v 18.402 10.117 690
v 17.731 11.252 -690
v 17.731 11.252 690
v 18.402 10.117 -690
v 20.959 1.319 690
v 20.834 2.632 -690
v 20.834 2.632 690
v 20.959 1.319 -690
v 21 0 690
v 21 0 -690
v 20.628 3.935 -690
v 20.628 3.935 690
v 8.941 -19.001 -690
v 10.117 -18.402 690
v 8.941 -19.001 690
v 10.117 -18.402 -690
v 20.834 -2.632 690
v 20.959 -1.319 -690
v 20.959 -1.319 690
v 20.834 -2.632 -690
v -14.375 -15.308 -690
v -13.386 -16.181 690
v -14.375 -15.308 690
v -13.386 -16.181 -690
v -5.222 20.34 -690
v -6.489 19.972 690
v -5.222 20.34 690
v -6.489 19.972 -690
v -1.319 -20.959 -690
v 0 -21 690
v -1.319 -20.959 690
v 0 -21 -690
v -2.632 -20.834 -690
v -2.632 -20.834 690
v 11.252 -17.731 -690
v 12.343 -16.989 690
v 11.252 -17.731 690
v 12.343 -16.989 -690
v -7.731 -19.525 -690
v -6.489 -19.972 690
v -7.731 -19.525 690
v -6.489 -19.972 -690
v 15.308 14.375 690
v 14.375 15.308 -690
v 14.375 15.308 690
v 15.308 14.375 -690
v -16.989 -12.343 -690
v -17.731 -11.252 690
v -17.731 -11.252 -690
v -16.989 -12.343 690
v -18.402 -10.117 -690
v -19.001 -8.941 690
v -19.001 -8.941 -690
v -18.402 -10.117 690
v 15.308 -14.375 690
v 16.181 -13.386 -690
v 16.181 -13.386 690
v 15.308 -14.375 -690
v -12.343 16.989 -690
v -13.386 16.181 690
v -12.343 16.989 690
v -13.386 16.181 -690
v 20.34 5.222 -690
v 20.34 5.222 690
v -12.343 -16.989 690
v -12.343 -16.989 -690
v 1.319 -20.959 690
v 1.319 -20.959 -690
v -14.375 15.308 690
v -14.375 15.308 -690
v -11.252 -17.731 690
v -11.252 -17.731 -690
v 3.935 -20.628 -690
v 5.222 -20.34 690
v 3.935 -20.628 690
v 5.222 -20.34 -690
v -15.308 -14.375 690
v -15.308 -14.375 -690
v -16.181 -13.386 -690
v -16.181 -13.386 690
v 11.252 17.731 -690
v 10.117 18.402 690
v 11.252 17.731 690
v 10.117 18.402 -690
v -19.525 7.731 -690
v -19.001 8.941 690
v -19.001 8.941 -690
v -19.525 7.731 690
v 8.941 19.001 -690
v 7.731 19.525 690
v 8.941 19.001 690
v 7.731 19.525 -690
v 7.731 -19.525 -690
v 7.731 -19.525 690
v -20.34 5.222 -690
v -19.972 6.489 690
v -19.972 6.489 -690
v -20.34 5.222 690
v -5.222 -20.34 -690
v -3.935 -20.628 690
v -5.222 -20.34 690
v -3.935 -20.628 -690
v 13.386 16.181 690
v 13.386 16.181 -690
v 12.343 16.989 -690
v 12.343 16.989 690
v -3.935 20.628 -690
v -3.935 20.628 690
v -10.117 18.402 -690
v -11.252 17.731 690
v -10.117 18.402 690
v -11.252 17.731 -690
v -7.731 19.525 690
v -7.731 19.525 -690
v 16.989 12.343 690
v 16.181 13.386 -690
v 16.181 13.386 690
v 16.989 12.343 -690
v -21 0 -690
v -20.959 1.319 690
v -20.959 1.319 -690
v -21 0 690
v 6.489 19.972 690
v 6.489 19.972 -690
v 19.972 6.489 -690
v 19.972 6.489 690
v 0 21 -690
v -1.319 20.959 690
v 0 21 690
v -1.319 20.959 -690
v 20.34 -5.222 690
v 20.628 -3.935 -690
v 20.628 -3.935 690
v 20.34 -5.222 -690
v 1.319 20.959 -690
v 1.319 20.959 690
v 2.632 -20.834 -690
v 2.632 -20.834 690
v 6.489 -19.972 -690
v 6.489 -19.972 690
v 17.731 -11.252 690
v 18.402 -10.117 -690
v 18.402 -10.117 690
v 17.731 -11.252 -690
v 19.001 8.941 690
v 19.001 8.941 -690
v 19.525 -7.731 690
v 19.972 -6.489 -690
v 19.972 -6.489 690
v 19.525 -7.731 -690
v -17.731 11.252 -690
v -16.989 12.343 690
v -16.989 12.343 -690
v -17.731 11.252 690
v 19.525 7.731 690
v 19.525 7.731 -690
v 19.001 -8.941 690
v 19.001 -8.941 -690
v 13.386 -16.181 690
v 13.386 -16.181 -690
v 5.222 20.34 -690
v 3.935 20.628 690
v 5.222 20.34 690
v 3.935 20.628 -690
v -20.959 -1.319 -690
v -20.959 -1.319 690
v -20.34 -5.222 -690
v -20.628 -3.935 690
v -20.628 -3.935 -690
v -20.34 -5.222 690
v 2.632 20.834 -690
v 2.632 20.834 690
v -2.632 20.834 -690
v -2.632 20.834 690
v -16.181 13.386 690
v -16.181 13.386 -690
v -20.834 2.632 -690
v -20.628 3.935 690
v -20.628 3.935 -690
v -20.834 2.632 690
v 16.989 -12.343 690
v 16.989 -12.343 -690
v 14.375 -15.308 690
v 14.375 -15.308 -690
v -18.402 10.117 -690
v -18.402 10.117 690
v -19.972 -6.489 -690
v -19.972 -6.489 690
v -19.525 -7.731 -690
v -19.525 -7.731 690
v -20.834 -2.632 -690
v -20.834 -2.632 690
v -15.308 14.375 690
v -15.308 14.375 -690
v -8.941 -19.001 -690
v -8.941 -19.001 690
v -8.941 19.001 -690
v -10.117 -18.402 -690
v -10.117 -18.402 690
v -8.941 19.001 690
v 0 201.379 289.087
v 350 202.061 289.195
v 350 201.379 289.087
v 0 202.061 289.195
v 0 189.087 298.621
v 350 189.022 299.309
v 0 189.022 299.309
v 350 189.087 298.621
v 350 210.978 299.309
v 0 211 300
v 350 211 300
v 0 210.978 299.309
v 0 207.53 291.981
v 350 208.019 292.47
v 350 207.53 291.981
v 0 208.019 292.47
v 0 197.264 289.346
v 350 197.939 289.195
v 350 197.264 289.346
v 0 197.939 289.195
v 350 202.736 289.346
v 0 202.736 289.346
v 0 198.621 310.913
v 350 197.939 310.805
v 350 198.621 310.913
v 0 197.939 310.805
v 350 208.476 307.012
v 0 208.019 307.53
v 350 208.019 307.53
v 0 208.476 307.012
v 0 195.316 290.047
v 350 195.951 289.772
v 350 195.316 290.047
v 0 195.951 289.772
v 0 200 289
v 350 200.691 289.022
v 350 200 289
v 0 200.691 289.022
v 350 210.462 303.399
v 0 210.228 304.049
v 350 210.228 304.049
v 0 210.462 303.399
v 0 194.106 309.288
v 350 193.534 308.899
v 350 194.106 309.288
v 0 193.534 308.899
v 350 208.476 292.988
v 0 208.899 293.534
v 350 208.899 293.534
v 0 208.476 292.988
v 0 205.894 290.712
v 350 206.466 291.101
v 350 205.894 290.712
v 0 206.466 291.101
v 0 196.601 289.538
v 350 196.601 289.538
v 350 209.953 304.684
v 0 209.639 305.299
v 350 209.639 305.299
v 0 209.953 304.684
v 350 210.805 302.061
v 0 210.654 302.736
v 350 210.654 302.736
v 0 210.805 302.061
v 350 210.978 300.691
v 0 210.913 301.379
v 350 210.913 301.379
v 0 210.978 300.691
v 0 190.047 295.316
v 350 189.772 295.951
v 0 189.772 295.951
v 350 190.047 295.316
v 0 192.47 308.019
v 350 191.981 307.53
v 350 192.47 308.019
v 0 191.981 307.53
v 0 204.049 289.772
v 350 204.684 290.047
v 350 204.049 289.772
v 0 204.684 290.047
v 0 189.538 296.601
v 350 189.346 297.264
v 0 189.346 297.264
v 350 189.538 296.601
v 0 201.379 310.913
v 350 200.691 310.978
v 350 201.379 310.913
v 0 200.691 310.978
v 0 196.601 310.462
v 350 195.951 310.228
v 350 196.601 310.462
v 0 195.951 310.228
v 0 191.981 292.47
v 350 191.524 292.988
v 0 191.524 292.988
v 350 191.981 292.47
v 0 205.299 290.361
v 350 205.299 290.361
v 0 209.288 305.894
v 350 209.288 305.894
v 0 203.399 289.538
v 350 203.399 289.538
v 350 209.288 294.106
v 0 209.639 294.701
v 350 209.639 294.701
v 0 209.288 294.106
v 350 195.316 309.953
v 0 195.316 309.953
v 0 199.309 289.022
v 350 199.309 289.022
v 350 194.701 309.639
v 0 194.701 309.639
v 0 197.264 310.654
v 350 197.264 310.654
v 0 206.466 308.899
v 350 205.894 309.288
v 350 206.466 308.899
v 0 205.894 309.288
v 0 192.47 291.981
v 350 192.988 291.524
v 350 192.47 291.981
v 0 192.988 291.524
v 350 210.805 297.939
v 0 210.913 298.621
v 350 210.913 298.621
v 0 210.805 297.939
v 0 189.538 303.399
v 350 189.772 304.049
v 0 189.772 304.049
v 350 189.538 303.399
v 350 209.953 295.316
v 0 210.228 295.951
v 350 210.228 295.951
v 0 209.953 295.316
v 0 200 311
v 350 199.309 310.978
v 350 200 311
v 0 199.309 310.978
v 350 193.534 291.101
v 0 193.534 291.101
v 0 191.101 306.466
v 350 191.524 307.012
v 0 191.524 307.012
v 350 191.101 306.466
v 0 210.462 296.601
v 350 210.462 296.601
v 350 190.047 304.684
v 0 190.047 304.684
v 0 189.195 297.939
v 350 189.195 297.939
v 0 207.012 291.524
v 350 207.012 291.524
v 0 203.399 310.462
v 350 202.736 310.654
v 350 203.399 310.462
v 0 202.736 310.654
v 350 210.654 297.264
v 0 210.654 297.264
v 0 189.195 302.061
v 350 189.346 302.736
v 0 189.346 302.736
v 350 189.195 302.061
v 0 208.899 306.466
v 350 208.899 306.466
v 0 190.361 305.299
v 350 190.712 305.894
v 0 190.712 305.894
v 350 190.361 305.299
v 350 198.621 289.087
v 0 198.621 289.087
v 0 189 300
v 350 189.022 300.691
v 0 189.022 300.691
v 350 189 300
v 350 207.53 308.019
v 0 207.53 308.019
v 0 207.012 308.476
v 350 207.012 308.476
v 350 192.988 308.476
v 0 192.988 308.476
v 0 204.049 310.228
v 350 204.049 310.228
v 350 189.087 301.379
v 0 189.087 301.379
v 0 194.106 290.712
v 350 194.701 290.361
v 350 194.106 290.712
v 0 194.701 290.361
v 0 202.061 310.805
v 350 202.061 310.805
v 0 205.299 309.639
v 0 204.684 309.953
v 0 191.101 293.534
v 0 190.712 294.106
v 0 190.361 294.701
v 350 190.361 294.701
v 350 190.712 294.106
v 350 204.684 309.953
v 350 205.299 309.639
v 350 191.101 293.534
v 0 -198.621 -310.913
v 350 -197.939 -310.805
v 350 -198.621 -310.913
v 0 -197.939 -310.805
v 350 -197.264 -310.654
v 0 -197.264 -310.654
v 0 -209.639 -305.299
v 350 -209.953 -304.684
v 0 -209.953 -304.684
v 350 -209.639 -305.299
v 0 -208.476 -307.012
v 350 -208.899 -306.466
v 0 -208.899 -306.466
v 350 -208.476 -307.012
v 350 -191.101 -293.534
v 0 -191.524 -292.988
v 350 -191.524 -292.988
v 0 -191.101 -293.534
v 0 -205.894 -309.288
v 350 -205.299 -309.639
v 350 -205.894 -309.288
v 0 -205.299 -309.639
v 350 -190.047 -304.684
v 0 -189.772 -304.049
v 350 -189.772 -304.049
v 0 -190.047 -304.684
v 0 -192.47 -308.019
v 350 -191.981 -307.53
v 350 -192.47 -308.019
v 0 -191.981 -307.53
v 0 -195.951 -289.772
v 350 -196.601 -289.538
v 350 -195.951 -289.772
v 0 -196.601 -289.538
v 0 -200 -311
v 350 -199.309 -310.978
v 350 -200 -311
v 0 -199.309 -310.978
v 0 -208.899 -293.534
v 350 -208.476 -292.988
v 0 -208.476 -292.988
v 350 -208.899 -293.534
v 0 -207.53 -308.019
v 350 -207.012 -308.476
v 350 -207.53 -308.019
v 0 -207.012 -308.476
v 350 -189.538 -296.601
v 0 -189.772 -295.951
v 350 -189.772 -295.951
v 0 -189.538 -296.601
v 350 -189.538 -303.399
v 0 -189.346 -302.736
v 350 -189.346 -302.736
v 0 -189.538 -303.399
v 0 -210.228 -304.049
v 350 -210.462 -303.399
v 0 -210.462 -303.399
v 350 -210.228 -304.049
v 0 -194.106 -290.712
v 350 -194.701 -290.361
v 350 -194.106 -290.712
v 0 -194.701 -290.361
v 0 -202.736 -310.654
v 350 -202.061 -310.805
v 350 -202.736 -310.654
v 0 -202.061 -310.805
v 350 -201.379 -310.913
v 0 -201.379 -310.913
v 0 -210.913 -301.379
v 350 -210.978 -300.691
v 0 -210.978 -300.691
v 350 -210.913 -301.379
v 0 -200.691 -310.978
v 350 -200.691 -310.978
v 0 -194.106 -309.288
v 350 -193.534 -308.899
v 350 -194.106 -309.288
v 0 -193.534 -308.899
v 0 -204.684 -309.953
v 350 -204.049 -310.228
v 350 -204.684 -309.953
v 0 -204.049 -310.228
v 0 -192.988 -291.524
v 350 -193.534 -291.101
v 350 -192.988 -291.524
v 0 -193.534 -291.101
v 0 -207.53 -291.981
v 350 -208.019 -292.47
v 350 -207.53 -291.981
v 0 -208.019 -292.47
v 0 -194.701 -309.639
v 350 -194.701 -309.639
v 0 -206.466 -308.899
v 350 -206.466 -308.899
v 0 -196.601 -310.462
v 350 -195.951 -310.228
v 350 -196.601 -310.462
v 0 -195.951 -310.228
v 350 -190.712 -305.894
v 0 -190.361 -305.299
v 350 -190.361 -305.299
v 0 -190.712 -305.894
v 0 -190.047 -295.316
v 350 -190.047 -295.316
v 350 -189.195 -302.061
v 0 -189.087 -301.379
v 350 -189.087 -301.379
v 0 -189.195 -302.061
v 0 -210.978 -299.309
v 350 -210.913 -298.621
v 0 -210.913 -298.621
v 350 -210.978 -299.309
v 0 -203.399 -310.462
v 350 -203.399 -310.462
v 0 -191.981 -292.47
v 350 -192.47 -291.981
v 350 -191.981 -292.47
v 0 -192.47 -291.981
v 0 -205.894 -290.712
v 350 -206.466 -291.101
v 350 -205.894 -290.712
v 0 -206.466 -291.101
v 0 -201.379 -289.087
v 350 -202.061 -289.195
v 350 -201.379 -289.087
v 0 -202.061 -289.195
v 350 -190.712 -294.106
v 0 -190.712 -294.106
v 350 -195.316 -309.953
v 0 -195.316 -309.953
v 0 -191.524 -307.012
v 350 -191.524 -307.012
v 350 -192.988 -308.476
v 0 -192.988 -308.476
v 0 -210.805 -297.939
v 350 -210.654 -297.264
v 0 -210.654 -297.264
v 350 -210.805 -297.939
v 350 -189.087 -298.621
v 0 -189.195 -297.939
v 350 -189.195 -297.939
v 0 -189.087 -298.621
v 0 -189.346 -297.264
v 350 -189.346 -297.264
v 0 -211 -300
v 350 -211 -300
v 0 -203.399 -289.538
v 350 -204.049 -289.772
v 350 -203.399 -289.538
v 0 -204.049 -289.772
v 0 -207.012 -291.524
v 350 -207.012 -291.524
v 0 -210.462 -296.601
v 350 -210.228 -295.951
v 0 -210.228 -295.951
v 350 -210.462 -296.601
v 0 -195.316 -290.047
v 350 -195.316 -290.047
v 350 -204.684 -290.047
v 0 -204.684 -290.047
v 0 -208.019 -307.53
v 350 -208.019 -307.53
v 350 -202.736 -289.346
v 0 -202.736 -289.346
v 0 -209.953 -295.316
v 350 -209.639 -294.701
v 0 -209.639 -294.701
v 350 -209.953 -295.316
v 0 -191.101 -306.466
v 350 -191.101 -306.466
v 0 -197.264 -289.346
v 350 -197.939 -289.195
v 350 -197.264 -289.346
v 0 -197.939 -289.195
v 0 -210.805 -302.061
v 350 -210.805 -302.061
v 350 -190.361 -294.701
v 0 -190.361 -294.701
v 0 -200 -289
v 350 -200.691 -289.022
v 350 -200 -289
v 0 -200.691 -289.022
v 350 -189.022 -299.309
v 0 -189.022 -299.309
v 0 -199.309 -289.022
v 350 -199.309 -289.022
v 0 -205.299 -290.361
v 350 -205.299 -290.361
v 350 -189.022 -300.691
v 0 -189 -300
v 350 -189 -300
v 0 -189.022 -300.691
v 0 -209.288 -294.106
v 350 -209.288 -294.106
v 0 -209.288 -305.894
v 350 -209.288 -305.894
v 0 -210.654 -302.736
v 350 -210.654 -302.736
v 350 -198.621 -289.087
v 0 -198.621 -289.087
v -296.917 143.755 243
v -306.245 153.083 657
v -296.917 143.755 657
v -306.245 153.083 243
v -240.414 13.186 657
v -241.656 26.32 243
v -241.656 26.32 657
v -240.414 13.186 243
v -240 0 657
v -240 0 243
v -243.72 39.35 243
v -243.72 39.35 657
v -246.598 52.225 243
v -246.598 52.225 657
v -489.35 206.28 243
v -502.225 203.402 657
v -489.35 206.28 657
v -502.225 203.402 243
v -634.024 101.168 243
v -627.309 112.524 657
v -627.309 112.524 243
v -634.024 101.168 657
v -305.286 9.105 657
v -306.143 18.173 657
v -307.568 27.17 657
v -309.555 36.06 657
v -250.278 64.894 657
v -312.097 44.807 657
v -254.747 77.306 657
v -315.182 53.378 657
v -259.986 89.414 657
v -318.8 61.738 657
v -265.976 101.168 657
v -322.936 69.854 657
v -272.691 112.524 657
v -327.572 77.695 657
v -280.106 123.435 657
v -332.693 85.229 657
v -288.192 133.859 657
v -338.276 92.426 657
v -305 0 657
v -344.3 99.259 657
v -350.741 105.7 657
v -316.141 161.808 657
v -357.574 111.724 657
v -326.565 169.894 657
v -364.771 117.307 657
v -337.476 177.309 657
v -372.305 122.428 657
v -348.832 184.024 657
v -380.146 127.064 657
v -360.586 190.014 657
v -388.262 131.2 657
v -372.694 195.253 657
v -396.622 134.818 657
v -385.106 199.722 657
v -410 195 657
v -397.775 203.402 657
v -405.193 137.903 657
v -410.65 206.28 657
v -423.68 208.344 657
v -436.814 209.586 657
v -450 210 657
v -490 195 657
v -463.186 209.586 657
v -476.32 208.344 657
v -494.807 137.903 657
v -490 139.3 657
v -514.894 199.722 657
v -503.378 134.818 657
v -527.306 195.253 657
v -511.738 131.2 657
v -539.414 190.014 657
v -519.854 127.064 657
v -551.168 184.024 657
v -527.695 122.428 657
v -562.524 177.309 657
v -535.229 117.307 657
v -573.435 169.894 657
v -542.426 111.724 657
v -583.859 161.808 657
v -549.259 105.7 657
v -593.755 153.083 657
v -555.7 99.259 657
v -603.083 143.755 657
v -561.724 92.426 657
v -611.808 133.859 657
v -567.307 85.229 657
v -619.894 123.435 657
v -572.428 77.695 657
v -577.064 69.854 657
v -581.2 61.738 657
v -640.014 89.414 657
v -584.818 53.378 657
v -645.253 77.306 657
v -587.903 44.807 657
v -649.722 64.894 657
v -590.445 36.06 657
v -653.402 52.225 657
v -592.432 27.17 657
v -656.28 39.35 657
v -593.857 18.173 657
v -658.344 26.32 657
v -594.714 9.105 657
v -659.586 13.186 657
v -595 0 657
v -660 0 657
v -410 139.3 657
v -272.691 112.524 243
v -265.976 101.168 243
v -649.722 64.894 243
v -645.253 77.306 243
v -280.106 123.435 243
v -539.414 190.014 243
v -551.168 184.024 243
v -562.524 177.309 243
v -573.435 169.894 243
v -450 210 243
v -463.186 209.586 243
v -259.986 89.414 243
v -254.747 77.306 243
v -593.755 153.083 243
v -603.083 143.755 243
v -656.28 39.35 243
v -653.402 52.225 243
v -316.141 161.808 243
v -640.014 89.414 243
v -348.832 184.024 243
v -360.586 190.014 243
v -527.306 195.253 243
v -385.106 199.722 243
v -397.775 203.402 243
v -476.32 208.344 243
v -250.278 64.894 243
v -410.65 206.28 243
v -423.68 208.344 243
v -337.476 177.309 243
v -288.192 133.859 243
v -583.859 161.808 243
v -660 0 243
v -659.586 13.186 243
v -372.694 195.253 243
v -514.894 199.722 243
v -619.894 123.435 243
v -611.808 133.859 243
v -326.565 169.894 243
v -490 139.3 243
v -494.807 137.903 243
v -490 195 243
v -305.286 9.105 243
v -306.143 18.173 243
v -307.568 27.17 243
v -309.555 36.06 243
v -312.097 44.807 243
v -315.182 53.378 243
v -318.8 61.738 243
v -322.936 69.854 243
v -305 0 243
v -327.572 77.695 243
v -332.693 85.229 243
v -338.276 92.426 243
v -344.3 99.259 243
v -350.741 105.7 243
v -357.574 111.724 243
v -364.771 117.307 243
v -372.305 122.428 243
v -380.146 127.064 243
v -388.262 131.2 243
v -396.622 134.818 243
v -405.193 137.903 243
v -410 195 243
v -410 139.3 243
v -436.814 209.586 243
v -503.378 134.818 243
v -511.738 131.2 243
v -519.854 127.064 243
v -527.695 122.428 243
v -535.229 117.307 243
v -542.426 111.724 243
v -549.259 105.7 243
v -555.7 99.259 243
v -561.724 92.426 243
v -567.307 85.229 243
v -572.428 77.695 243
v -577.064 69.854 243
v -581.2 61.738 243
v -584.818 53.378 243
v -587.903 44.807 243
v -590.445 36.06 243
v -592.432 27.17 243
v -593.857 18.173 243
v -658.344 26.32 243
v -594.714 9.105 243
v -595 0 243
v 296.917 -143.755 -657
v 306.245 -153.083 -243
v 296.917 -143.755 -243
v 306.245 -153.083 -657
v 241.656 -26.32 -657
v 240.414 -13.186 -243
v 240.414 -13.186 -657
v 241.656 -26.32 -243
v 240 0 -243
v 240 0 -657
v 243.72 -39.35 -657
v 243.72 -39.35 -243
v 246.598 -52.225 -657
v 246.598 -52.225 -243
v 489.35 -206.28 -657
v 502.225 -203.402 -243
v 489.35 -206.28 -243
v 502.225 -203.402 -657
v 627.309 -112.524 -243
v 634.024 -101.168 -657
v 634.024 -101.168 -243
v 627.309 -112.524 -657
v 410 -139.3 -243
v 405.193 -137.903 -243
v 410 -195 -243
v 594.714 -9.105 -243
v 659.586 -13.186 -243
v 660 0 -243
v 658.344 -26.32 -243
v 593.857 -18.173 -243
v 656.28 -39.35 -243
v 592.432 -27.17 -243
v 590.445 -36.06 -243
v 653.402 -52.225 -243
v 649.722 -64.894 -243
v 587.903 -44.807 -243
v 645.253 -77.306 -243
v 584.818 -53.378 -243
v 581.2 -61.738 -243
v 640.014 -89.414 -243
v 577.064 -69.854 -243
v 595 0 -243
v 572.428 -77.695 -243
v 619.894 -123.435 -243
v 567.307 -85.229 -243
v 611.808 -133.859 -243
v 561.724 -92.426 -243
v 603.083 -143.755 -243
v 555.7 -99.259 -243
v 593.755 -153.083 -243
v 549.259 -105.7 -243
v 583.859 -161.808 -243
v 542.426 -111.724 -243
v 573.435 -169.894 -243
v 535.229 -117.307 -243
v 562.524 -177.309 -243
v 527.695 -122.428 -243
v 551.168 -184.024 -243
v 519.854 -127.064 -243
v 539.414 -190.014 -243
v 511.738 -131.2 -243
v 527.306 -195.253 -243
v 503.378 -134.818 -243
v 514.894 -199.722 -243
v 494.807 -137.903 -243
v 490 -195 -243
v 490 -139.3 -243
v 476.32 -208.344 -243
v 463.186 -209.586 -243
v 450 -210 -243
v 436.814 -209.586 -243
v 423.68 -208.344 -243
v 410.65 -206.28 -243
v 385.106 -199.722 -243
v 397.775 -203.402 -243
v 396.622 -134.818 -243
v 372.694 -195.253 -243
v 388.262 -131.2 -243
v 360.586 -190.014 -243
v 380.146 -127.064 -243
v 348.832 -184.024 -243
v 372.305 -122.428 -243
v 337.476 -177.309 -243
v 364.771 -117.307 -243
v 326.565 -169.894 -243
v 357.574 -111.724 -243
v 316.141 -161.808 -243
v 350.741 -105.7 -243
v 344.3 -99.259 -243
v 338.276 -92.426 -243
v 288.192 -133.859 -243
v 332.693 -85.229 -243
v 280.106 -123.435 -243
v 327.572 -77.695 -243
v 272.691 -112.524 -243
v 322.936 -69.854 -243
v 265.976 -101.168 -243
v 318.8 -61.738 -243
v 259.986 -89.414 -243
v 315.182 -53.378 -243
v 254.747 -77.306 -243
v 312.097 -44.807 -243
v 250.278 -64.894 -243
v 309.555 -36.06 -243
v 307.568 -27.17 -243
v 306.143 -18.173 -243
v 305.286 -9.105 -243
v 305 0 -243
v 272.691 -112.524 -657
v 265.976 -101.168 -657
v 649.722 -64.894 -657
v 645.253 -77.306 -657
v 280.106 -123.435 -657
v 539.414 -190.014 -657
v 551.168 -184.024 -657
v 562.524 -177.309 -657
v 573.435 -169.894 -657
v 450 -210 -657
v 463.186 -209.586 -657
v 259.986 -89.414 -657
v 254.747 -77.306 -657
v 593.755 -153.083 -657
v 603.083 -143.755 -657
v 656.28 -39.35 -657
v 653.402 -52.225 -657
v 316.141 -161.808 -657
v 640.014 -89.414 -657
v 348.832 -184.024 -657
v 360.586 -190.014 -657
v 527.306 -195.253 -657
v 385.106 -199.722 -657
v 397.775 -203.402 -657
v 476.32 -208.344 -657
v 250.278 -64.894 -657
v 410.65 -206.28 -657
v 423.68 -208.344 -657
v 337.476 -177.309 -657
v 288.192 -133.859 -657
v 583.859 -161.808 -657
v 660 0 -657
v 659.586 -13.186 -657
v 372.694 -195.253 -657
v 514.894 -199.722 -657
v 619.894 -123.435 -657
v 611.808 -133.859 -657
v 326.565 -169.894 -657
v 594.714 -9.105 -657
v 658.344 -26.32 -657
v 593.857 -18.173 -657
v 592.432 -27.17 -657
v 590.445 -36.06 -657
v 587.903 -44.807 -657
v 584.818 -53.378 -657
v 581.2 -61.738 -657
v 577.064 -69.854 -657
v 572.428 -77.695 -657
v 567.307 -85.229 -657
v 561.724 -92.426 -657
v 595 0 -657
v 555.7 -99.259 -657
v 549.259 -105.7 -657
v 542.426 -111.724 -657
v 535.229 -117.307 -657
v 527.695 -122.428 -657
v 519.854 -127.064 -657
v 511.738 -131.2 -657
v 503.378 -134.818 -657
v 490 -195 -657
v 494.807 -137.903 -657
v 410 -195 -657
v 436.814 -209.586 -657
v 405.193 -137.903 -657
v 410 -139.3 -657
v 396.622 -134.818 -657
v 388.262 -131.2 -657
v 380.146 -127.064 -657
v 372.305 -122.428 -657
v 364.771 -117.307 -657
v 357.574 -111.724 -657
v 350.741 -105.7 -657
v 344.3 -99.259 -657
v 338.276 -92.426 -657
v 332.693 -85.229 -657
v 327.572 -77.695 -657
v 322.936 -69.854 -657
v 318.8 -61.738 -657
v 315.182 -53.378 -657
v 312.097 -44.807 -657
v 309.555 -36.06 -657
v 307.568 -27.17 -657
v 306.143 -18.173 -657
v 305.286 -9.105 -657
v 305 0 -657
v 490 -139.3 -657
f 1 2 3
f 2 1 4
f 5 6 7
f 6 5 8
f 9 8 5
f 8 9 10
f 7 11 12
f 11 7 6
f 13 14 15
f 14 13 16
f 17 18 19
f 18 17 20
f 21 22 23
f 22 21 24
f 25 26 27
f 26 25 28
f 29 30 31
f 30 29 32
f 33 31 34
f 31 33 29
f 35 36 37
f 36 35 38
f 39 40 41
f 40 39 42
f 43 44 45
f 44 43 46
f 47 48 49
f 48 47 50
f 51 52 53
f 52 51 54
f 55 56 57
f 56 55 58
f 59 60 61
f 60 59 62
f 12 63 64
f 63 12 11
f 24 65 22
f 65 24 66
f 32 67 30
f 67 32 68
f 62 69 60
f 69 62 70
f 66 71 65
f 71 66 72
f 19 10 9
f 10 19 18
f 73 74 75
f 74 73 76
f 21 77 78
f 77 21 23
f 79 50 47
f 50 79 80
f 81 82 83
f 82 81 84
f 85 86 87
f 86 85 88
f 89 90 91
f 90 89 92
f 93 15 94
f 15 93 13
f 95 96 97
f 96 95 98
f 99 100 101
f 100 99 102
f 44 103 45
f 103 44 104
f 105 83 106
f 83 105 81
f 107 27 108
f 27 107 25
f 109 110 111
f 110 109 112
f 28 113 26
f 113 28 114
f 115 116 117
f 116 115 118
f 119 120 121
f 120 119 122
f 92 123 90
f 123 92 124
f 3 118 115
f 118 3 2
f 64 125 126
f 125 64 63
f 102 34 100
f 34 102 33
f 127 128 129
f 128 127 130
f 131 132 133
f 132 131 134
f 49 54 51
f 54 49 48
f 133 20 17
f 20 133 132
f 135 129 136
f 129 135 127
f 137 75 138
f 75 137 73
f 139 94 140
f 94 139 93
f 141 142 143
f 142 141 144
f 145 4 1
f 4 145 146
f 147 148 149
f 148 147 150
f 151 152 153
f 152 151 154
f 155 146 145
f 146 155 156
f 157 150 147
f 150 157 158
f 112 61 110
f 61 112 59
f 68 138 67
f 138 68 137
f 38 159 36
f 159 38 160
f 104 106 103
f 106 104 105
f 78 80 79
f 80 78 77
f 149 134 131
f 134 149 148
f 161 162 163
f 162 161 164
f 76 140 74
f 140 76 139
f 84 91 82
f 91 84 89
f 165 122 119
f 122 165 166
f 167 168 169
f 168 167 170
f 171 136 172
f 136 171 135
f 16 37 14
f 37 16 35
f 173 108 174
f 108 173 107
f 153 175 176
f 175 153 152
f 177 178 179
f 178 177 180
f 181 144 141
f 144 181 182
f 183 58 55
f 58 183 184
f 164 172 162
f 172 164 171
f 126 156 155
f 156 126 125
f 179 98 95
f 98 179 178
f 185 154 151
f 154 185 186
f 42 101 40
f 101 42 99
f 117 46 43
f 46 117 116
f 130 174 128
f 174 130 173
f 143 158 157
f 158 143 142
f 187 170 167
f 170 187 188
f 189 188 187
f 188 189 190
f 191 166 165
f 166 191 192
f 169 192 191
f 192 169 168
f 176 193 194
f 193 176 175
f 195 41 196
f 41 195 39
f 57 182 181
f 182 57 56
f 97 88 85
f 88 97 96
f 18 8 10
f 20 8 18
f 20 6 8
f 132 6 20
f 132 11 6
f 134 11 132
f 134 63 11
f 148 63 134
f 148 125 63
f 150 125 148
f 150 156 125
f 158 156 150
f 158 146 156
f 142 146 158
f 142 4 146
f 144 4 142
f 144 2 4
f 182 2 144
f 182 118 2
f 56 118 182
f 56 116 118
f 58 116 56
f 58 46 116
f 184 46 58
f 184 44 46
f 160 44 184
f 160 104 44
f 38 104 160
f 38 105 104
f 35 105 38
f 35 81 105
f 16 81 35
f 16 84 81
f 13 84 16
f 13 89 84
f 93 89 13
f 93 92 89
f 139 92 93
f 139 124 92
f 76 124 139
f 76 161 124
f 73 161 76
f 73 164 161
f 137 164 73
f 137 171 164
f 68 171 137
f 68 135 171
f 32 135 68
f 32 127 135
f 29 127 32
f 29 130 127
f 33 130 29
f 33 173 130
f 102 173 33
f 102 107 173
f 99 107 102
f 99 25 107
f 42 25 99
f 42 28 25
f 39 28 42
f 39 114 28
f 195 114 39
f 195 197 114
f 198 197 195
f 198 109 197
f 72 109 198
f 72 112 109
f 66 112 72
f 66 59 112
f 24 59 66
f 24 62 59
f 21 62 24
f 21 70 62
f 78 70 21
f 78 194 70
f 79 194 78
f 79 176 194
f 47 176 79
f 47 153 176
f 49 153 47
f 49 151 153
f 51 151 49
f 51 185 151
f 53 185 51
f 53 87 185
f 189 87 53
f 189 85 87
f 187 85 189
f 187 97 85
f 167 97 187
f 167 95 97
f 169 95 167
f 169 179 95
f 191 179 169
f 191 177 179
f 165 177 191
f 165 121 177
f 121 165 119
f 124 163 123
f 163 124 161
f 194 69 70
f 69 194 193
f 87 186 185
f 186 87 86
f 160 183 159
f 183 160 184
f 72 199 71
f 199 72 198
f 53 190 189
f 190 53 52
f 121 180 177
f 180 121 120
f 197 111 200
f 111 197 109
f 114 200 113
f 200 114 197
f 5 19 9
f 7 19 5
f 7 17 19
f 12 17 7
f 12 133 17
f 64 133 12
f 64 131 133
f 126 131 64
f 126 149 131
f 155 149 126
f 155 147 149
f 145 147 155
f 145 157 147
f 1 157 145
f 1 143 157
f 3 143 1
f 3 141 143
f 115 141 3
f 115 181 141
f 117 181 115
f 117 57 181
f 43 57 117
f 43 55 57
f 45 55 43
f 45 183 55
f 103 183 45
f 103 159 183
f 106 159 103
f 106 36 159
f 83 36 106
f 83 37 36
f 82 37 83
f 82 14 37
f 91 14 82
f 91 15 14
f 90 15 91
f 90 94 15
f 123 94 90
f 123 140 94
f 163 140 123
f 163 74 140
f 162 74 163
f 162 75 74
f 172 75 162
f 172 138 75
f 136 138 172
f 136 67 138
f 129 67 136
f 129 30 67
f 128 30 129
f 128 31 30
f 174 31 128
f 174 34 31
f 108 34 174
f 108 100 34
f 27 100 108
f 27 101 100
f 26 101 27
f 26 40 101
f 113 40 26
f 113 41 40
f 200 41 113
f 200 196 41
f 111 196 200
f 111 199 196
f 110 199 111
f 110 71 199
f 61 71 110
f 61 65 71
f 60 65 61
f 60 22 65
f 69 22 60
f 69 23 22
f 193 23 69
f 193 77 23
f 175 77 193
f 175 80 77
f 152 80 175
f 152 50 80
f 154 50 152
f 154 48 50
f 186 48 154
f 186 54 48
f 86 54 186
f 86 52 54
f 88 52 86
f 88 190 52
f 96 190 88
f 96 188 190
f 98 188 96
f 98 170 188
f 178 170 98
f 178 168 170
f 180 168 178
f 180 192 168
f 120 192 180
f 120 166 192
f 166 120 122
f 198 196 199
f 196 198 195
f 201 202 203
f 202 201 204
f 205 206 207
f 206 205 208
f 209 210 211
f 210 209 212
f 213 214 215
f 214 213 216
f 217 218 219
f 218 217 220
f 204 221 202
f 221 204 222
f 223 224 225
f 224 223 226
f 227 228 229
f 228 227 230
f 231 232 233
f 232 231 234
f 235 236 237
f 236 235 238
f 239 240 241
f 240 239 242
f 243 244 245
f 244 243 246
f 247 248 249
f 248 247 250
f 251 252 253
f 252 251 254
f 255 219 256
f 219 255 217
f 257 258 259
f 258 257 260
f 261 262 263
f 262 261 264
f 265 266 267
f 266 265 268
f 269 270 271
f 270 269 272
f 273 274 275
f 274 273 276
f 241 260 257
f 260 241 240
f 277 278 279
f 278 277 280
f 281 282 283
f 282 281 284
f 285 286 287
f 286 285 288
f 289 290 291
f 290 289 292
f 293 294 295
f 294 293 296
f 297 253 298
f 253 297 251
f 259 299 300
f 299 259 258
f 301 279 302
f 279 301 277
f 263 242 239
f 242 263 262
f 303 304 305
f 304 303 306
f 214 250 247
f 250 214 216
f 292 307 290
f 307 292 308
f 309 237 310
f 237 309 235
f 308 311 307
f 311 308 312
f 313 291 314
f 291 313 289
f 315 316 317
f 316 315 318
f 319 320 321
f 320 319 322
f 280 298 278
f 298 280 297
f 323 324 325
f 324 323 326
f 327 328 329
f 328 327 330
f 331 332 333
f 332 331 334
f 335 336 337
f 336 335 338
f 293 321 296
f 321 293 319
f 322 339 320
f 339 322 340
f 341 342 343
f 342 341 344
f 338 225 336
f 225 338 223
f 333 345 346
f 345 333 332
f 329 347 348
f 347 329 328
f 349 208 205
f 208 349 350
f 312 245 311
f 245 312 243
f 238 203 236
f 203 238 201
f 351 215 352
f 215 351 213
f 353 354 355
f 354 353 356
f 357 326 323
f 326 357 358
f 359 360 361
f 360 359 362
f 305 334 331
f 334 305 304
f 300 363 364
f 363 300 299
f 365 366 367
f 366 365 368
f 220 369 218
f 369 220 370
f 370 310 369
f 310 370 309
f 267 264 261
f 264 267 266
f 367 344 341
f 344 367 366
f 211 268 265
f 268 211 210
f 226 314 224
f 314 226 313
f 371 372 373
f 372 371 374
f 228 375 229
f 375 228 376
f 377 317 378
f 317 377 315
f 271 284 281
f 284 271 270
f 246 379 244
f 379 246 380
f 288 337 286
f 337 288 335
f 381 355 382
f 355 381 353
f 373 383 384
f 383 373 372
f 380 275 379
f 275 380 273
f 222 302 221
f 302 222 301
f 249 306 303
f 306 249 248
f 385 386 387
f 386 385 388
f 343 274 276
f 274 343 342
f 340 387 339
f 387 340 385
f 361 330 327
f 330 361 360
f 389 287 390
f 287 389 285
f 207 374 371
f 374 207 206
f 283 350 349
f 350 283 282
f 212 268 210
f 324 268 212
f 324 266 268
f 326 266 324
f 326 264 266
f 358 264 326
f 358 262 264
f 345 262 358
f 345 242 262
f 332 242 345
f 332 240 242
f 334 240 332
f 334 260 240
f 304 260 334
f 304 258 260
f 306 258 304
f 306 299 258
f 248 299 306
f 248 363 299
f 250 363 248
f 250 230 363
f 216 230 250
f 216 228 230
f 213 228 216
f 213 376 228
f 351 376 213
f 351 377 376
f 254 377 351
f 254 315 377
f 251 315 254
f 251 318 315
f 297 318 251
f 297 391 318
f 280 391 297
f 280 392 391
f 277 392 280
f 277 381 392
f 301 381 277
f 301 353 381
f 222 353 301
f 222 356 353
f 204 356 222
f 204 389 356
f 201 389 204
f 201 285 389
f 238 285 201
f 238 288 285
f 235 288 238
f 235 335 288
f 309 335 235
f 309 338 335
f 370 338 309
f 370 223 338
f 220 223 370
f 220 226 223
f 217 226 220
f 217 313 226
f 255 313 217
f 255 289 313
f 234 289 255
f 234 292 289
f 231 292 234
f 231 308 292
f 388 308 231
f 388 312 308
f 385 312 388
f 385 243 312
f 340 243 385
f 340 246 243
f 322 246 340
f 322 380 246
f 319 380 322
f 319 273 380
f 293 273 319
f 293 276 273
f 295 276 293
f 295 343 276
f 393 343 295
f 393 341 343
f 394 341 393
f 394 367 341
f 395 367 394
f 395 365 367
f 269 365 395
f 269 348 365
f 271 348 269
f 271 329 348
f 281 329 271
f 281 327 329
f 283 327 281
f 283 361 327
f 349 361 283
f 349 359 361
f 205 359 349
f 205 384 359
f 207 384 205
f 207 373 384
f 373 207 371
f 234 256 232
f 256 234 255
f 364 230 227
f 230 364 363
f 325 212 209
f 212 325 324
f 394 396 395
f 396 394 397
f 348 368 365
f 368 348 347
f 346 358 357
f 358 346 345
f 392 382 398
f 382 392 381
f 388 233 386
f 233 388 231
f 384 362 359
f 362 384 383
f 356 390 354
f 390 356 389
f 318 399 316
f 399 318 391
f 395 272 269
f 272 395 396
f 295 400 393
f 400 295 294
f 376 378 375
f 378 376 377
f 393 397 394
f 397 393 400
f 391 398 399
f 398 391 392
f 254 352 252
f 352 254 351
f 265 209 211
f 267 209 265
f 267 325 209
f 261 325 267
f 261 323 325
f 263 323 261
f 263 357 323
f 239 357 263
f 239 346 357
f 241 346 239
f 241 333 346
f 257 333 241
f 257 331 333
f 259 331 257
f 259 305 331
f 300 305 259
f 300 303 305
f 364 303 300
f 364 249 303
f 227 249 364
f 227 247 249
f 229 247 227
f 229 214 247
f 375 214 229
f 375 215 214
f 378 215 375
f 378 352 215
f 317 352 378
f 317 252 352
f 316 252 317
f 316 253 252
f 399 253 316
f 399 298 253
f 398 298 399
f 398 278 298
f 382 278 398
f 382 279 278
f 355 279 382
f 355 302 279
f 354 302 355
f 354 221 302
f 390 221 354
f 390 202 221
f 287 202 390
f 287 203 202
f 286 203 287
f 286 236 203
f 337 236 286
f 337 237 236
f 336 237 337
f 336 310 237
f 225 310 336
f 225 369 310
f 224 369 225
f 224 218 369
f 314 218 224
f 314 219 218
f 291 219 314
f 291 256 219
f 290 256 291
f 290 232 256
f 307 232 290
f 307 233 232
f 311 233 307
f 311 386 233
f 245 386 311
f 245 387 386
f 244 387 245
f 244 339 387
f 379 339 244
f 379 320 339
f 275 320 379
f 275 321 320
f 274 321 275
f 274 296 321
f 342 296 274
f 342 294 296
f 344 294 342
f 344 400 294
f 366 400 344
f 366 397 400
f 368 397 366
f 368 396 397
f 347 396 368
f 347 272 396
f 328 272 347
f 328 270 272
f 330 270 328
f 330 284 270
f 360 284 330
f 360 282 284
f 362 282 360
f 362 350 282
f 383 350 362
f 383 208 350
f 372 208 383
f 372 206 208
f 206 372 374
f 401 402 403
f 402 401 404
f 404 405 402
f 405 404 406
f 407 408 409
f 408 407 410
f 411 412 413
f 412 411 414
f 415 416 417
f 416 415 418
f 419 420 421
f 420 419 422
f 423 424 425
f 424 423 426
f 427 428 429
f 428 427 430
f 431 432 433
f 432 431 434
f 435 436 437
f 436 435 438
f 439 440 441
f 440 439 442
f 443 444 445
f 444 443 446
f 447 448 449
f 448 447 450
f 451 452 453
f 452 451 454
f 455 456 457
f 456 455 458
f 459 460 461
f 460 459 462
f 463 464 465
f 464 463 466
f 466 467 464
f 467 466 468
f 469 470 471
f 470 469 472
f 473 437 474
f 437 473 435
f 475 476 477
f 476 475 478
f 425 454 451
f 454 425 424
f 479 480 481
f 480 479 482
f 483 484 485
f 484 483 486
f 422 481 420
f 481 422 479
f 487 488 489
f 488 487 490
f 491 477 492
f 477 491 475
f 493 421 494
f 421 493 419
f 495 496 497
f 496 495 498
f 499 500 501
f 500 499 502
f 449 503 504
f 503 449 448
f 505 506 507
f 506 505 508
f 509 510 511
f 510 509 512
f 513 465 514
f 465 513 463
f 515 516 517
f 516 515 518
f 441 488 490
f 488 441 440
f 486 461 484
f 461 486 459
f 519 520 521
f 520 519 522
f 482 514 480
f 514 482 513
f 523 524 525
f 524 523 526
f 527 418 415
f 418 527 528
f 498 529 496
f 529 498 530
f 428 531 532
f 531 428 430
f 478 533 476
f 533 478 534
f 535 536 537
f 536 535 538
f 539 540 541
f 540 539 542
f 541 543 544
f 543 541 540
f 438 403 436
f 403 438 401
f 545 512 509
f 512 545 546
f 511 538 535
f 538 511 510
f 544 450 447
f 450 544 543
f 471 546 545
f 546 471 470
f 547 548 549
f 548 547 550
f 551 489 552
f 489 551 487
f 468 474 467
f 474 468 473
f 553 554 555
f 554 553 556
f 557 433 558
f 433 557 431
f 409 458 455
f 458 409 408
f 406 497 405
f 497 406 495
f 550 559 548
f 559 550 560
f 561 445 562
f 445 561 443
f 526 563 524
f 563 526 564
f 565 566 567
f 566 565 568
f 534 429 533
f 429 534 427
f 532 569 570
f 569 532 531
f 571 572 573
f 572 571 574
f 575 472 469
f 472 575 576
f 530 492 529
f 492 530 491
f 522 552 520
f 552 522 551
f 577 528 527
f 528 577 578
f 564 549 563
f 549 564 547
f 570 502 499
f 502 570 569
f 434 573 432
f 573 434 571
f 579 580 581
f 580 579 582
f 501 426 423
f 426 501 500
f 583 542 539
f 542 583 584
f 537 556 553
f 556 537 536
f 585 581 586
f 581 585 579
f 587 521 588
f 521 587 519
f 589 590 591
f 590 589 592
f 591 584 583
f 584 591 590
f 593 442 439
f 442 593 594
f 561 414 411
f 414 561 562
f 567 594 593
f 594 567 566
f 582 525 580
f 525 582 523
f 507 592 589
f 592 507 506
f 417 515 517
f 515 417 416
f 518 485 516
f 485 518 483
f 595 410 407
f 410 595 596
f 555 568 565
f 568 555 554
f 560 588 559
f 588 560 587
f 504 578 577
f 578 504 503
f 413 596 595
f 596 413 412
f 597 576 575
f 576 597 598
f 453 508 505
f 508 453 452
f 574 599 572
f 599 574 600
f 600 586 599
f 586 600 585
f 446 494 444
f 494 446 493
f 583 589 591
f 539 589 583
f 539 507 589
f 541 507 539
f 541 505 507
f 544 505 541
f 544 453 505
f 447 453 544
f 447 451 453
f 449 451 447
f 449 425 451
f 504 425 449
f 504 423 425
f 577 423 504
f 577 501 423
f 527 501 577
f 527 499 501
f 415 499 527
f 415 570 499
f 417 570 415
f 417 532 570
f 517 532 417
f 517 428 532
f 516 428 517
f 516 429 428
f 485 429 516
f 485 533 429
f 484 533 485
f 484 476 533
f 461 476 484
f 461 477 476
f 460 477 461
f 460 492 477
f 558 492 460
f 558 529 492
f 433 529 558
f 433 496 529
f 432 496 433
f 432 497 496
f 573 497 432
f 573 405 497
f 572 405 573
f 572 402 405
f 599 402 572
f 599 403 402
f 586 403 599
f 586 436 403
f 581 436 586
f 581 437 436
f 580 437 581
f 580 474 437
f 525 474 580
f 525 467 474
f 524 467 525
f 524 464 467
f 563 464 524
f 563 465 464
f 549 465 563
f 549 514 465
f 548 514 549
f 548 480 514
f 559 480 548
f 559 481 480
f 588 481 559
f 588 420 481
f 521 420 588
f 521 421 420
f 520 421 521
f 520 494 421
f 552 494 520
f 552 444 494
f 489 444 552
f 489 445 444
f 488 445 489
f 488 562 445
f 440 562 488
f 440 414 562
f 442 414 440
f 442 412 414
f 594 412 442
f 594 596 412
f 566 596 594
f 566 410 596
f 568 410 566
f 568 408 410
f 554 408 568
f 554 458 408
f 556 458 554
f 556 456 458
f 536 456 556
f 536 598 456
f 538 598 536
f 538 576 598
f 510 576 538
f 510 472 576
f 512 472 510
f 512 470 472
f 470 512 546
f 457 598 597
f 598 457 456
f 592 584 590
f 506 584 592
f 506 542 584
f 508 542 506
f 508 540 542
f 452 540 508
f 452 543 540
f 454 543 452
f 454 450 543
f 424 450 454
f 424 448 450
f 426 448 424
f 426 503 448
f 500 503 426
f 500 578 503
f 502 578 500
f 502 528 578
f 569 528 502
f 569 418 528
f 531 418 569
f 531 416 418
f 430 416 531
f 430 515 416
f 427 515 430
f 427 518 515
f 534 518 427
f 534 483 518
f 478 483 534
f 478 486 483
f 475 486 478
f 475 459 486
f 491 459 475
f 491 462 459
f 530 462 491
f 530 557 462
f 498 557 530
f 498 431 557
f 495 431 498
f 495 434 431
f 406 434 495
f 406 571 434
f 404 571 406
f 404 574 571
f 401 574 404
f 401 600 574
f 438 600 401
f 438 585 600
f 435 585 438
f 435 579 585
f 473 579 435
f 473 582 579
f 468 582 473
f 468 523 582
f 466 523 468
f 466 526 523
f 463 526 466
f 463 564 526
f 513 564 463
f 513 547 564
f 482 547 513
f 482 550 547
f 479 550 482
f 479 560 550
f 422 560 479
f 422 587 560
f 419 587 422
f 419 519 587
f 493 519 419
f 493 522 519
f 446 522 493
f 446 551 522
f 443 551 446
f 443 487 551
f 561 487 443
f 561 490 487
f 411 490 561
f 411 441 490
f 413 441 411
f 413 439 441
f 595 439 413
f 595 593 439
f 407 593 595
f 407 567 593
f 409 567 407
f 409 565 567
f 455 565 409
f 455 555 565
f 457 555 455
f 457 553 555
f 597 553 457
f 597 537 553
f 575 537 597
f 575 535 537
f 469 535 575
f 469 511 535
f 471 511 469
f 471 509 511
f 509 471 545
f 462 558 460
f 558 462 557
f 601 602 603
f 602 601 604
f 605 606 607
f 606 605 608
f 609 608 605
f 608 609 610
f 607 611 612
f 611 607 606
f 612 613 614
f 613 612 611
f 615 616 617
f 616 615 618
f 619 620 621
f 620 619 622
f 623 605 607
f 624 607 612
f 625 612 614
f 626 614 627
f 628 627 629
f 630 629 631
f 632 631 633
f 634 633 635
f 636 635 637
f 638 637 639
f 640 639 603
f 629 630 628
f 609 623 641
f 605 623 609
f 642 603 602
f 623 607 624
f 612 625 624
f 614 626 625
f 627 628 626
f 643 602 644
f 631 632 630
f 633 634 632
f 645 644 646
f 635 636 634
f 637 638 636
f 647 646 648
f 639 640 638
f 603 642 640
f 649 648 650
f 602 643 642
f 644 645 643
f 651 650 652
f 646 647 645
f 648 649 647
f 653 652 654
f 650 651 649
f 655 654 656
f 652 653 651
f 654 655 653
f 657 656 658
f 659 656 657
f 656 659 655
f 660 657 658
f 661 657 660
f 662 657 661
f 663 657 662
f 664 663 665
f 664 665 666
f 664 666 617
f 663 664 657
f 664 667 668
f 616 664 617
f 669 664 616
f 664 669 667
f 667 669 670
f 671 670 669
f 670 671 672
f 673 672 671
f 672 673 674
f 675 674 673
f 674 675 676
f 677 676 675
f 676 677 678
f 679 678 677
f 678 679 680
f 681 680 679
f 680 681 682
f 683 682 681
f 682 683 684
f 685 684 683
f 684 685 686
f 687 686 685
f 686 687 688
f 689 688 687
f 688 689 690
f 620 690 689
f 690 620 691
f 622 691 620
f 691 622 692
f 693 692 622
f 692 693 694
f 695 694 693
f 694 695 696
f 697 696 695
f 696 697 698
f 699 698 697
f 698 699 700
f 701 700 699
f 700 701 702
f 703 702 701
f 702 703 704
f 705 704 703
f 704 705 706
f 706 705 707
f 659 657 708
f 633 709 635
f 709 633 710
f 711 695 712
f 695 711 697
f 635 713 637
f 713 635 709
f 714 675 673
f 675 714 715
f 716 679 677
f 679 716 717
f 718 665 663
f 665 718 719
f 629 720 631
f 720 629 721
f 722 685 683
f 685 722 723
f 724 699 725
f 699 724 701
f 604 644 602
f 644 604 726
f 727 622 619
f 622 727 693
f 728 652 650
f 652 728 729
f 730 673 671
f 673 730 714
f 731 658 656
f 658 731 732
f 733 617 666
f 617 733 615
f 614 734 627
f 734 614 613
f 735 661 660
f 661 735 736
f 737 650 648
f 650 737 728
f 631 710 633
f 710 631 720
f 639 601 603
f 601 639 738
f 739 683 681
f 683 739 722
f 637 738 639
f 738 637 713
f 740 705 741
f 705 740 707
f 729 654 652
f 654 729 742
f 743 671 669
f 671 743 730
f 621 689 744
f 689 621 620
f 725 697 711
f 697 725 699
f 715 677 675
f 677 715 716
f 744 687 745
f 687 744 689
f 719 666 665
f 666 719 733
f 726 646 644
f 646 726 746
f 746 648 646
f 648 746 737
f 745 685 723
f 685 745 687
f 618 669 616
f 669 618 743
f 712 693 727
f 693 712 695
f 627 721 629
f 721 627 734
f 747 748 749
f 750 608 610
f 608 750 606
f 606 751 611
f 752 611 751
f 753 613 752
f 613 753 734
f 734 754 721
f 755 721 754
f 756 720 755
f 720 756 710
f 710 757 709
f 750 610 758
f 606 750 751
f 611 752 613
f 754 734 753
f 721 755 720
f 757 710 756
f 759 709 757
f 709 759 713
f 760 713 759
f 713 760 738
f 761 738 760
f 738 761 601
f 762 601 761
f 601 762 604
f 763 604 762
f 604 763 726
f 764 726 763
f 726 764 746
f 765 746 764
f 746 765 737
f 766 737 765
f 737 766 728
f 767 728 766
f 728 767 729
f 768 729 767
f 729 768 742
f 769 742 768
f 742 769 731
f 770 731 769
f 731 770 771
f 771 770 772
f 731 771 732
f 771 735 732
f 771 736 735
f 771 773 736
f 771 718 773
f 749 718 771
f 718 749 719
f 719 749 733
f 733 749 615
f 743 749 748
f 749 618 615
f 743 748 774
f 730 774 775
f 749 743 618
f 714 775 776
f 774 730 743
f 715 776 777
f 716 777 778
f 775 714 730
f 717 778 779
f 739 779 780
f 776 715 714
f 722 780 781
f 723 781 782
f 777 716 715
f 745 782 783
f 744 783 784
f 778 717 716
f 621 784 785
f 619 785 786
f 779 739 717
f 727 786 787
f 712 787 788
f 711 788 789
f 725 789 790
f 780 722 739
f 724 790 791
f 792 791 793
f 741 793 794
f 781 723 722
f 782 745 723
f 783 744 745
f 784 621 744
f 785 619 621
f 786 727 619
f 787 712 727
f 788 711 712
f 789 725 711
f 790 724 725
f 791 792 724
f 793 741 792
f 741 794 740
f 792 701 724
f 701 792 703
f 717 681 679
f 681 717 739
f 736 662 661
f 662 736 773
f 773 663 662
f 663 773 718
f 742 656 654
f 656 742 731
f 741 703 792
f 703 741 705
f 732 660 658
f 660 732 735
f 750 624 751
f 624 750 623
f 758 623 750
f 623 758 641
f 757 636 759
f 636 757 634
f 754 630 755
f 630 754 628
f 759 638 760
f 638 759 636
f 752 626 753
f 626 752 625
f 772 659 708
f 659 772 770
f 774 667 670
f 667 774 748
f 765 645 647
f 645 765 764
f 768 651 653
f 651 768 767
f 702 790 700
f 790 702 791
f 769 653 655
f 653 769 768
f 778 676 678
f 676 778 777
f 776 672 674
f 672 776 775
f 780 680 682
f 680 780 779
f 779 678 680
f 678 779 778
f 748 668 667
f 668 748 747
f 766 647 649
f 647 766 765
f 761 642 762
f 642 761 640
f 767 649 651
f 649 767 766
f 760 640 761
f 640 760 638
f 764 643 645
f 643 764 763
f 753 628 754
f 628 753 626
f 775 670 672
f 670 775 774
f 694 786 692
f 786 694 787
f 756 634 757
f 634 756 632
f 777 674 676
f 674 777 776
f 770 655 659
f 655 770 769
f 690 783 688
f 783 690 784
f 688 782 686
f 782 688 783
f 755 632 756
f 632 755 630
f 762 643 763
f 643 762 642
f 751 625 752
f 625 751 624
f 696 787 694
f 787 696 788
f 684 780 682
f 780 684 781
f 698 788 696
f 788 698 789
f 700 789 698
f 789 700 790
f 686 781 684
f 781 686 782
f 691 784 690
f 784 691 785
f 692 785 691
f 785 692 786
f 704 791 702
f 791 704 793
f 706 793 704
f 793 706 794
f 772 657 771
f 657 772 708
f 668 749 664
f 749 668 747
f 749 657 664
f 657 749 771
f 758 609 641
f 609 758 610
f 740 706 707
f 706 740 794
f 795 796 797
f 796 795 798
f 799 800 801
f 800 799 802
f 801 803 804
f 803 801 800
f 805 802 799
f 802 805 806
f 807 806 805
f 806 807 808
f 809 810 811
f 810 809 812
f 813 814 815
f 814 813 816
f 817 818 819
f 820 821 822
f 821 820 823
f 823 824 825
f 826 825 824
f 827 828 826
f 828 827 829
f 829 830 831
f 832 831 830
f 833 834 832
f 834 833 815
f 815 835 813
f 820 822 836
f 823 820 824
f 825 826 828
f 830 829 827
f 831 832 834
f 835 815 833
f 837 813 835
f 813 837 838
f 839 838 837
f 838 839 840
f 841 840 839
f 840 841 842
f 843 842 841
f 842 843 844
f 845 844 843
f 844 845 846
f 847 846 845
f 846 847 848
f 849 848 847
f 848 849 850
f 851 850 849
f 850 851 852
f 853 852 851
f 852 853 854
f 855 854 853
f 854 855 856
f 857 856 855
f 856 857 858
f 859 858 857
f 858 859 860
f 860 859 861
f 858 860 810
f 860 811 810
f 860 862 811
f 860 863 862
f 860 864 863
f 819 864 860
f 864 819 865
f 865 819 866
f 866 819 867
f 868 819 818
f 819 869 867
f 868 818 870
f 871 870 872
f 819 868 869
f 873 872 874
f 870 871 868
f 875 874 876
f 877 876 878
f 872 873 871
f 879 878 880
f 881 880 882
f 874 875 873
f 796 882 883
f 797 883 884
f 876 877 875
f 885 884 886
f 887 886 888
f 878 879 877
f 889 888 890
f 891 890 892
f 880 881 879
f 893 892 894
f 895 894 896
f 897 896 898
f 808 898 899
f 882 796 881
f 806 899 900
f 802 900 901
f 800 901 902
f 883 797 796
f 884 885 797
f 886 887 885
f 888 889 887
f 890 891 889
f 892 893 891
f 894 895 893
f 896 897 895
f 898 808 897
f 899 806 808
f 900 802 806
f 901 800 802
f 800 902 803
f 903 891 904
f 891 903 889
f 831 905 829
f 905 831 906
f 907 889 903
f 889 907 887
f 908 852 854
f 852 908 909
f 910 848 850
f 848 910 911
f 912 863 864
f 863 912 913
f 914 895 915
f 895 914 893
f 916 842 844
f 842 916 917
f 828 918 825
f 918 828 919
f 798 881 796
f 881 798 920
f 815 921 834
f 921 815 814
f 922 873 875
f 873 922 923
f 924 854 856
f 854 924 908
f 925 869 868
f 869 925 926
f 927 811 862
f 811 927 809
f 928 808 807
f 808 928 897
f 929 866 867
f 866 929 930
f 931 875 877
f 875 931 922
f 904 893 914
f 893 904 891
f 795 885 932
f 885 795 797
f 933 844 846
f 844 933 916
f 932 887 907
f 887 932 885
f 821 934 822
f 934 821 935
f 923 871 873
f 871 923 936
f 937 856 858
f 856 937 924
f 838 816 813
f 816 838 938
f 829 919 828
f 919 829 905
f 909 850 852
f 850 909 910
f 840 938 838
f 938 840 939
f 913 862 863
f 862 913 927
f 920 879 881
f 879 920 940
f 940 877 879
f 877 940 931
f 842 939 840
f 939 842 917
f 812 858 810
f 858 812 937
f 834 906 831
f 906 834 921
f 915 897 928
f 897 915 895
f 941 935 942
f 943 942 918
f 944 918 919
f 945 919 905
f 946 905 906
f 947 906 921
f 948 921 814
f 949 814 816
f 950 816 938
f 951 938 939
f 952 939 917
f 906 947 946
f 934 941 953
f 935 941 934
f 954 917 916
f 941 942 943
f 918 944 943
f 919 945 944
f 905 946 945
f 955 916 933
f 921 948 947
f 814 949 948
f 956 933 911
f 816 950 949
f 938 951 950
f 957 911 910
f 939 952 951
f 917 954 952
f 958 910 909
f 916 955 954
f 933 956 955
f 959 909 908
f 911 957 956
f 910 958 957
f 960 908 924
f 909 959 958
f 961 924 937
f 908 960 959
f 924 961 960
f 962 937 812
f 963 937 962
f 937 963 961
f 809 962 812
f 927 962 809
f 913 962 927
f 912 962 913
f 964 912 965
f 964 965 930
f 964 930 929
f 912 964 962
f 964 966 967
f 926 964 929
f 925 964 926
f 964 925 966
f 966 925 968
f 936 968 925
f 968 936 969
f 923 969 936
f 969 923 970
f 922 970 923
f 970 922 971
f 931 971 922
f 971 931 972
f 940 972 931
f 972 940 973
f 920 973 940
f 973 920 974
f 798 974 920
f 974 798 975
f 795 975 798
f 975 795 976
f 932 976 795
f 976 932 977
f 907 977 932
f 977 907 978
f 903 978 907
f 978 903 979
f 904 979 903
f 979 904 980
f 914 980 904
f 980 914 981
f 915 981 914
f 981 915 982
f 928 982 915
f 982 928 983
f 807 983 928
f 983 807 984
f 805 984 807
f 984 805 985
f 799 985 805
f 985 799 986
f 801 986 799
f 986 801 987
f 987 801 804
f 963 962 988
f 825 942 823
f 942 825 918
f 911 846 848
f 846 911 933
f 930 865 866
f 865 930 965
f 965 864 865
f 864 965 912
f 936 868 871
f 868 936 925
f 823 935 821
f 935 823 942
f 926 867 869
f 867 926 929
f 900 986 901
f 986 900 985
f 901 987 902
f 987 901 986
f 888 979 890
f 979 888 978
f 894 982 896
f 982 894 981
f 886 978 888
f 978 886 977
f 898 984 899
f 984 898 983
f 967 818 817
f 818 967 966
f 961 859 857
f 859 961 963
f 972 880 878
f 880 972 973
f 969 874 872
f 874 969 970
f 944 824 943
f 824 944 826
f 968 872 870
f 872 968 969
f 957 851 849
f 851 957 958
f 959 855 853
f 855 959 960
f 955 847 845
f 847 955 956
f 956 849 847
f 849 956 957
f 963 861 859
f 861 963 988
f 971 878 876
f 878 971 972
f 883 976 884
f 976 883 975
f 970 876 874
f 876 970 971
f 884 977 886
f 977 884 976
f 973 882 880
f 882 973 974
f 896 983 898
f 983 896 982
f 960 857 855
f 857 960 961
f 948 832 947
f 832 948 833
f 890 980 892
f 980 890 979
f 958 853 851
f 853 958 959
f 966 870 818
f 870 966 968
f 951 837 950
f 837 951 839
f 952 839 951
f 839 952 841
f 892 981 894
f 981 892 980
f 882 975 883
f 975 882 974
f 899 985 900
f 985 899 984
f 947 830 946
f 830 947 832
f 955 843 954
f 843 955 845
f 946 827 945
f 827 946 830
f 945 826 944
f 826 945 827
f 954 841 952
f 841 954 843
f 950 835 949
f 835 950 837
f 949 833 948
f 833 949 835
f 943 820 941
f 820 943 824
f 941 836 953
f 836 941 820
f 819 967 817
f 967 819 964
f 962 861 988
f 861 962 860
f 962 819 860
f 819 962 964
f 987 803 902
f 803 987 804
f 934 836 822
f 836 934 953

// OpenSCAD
// ============================================================================
// PROJECT: XXXG-00W0 WING GUNDAM ZERO EW - SHOULDER INNER BACKBONE INFRA
// COMPONENT VAULT: BANDAI CAST RUNNER G - EMA SHOULDER CORES G11 & G12
// TECHNOLOGY BASE: DUAL-MOTION ELECTROMAGNETIC POWER-BY-WIRE ACTUATION
// DESIGN STYLE: NVIDIA FOUNDERS EDITION AGGRESSIVE PLANAR GEOMETRY MATRIX
// CONFIG METRIC: SCALED TITANIUM CYLINDER HOUSINGS (1:1 ACTUAL METRIC)
// ============================================================================

$fn = 100; // High-precision circular resolution segment count

// Structural Constants Scaled 1:1 for a 16.7-Meter Airframe Scale (mm)
block_total_length = 920;                // Total longitudinal vertical height (mm)
ema_chamber_diameter = 290;             // Internal cavity diameter for EMA housing (mm)
armor_skin_thickness = 65;              // Solid TiAl protective plating wall (mm)
harness_conduit_width = 80;             // Cast-in 4oz copper logic trace track (mm)
capacitor_pocket_depth = 15;            // Sub-armor recessed housing pocket depth (mm)
capacitor_pocket_width = 140;           // Transverse MLCC array pocket width (mm)

module Runner_G_EMA_Shoulder_Forge() {
    // Central Supply Injection Runner Axis (Molten Feed Line from Siphon Forge)
    color([0.22, 0.22, 0.25]) {
        cylinder(h = block_total_length * 1.5, d = 42, center = true);
        // Direct injection gates tracking straight into the part mold cavities
        translate([0, 200, 300]) rotate([0, 90, 0]) cylinder(h = 350, d = 22);
        translate([0, -200, -300]) rotate([0, 90, 0]) cylinder(h = 350, d = 22);
    }
    
    // Instantiate Scaled Skeutomorphic Part Molds Symmetrically (Left & Right)
    Cast_Internal_EMA_Shoulders();
}

module Cast_Internal_EMA_Shoulders() {
    // ---- PART G11: INTERNAL LEFT STRUCTURAL UPPER EMA SHOULDER COUPLING ----
    translate([-450, 0, 450]) color([0.35, 0.35, 0.38]) { // Inner Frame Dark Spec
        difference() {
            // Main solid heavy-duty core joint connection block segment
            cylinder(h = block_total_length * 0.45, d = _OFFSET_ORLOAD + (armor_skin_thickness * 2), center = true);
            
            // CENTRAL DUAL-MOTION EMA CHAMBER [Bored out for independent linear & helical coil slots]
            cylinder(h = block_total_length * 0.5, d = _OFFSET_ORLOAD, center = true);
            
            // SUB-ARMOR RECESSED CAPACITOR POCKETS [Segmented rows cut inside the armor inner wall]
            for (z_offset = [-120, 0, 120]) {
                translate([0, (_OFFSET_ORLOAD/2 - armor_skin_thickness + capacitor_pocket_depth/2 + 20), z_offset])
                    cube([capacitor_pocket_width, capacitor_pocket_depth, 100], center = true);
            }
            
            // Continuous cast-in routing track for the 4oz solid-state wiring rails
            cube([harness_conduit_width, _OFFSET_ORLOAD + 100, block_total_length], center = true);
            
            // Slicing profile tool to generate an asymmetrical half-shell part component
            translate([0, -_OFFSET_ORLOAD, 0])
                cube([_OFFSET_ORLOAD * 2, _OFFSET_ORLOAD * 2, block_total_length * 2], center = true);
        }
    }
    
    // ---- PART G12: INTERNAL RIGHT STRUCTURAL UPPER EMA SHOULDER COUPLING ----
    translate([450, 0, -450]) rotate([0, 0, 180]) color([0.35, 0.35, 0.38]) {
        difference() {
            cylinder(h = block_total_length * 0.45, d = _OFFSET_ORLOAD + (armor_skin_thickness * 2), center = true);
            cylinder(h = block_total_length * 0.5, d = _OFFSET_ORLOAD, center = true);
            
            for (z_offset = [-120, 0, 120]) {
                translate([0, (_OFFSET_ORLOAD/2 - armor_skin_thickness + capacitor_pocket_depth/2 + 20), z_offset])
                    cube([capacitor_pocket_width, capacitor_pocket_depth, 100], center = true);
            }
            
            cube([harness_conduit_width, _OFFSET_ORLOAD + 100, block_total_length], center = true);
            translate([0, -_OFFSET_ORLOAD, 0])
                cube([_OFFSET_ORLOAD * 2, _OFFSET_ORLOAD * 2, block_total_length * 2], center = true);
        }
    }
}

// Global variable definition to map the chamber parameter cleanly
_OFFSET_ORLOAD = ema_chamber_diameter;

// Render Master Assembly to Parameter Workspace
Runner_G_EMA_Shoulder_Forge();
